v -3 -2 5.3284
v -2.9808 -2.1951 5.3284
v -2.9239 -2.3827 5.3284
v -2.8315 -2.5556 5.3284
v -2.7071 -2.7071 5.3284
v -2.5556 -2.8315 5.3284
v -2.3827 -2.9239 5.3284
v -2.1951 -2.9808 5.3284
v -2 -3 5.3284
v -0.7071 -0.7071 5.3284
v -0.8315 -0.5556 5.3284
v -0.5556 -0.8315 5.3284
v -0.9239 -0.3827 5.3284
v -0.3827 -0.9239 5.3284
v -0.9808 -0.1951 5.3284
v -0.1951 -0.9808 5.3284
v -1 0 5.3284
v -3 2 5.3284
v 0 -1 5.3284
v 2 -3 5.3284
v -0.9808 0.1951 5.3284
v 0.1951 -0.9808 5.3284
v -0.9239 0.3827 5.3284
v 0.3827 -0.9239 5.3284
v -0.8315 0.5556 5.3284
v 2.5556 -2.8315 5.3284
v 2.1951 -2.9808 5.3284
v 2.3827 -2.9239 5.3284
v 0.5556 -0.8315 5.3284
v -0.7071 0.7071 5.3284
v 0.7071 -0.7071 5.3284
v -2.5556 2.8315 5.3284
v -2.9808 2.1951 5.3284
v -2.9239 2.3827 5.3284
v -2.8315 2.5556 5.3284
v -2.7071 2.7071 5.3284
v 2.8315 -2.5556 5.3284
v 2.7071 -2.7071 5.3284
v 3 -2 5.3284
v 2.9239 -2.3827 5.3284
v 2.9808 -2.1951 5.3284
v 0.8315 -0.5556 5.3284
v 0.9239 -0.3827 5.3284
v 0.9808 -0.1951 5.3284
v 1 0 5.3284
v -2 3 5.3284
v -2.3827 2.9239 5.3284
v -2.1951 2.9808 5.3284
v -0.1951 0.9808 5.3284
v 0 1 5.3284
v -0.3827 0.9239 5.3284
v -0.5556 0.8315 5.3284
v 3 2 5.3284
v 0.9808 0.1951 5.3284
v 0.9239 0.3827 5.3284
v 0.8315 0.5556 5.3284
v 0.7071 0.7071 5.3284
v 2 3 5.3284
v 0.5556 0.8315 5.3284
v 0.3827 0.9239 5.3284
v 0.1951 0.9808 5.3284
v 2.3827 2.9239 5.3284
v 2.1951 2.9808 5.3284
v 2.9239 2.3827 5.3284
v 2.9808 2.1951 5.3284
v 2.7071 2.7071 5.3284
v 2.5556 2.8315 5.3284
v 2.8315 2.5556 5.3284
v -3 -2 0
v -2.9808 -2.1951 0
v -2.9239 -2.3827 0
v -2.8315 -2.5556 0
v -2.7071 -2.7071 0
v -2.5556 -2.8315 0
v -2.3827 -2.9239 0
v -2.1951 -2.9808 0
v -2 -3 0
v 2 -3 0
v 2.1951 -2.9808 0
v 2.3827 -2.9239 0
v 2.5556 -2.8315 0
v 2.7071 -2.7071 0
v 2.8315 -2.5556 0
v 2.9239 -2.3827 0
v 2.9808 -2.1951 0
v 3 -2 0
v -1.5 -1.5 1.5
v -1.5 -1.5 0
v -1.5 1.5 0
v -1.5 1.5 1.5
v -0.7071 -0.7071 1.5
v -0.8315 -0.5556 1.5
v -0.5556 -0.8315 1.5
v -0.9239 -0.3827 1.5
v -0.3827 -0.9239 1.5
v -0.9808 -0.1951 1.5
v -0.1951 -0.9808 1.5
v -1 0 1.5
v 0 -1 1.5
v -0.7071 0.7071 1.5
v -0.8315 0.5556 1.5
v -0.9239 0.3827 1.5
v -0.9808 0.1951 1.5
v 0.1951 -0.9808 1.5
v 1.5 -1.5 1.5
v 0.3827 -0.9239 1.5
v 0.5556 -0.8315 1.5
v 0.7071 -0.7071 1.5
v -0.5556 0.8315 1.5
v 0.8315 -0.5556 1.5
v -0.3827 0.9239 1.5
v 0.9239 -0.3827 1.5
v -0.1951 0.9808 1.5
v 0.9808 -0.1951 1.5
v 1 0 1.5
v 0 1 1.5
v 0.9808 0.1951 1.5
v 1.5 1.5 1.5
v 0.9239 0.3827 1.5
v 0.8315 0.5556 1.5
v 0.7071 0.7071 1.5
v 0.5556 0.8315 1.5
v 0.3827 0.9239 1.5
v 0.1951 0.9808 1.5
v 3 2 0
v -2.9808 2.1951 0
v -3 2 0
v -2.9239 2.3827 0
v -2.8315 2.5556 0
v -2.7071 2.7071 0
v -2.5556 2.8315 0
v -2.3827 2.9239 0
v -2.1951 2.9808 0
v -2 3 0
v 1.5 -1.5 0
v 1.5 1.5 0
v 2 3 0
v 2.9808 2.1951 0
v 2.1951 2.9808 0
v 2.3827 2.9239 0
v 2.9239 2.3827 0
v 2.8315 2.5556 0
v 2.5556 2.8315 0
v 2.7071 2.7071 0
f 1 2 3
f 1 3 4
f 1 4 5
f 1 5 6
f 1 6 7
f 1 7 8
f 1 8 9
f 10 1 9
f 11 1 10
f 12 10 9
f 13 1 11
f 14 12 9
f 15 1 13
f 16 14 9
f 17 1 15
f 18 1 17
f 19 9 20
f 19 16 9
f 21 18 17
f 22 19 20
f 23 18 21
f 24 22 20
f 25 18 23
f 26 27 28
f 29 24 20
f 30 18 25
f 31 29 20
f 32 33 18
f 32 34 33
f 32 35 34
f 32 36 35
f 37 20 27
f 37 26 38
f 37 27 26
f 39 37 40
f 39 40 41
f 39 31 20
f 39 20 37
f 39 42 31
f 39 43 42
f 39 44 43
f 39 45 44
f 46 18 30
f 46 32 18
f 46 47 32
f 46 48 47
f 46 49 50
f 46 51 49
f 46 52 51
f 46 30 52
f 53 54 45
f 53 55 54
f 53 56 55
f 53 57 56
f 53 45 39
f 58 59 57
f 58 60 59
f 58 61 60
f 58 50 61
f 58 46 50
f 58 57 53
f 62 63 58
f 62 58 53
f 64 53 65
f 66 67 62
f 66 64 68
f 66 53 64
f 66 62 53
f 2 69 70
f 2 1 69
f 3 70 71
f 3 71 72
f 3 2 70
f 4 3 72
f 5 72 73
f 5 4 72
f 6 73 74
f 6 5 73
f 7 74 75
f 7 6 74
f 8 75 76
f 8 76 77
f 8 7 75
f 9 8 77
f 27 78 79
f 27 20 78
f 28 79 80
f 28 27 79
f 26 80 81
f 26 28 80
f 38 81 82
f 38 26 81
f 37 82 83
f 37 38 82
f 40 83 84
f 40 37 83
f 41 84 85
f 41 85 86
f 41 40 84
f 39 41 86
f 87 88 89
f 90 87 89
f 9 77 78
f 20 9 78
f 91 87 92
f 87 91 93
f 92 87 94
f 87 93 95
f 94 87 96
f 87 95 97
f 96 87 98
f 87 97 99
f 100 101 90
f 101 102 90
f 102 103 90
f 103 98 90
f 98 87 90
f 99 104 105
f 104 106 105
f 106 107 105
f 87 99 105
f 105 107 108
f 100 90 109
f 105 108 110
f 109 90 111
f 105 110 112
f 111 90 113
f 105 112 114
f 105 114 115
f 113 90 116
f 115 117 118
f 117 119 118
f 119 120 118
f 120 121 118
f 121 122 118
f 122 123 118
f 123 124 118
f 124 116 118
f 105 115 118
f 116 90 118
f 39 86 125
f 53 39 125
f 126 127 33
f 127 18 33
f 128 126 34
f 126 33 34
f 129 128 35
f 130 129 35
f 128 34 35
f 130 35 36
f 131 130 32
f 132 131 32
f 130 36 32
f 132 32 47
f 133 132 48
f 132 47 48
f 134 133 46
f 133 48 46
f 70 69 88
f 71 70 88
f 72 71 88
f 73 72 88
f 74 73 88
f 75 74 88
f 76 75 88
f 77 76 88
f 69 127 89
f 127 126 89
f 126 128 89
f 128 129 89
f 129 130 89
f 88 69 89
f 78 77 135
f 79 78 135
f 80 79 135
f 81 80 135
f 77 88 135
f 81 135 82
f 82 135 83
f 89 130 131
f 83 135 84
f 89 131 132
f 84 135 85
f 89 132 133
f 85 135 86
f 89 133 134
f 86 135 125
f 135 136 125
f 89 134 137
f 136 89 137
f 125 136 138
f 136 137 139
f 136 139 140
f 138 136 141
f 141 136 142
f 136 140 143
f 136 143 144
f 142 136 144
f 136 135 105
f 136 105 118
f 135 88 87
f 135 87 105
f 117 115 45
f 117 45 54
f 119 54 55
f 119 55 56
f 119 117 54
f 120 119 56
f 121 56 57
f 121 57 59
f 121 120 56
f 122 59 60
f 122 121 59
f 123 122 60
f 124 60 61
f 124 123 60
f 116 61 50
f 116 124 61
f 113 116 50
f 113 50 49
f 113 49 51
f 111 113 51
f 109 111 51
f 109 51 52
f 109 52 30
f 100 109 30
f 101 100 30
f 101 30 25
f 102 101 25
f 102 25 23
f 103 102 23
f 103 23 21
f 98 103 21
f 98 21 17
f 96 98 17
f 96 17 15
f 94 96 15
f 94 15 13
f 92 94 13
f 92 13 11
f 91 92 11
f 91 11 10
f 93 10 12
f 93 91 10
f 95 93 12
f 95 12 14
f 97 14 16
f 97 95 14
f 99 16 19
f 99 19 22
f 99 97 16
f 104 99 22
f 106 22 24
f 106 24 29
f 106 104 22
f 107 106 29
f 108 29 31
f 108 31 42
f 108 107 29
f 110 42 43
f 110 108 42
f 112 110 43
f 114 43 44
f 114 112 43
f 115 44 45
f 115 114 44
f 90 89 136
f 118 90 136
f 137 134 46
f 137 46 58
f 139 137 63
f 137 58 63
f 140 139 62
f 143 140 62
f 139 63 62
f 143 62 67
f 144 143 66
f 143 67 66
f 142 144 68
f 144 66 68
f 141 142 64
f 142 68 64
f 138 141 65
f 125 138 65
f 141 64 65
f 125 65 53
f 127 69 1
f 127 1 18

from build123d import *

# Parameters (mm, degrees)
F0_W     = 6
F0_H     = 6
F0_W_2   = 3
F0_H_2   = 3
F0_R     = 1
F2_DEPTH = 5.328427
F3_DEPTH = 1.5
F4_R     = 1


with BuildPart() as f2:
    # F0 (on Top) → F2 (new body, through all)
    with BuildSketch(Plane.XY):
        Rectangle(F0_W, F0_H)
        Rectangle(F0_W_2, F0_H_2, mode=Mode.SUBTRACT)
        Rectangle(F0_W_2, F0_H_2)
        Circle(F0_R, mode=Mode.SUBTRACT)
    extrude(amount=F2_DEPTH)

    # F0 (on Top) → F3 (cut)
    with BuildSketch(Plane.XY):
        Rectangle(F0_W_2, F0_H_2)
        Circle(F0_R, mode=Mode.SUBTRACT)
    extrude(amount=F3_DEPTH, mode=Mode.SUBTRACT)

    # F4
    f4_edges = [f2.edges().sort_by_distance(p)[0] for p in [
        (-3, -3, 2.664214),
        (3, -3, 2.664214),
        (3, 3, 2.664214),
        (-3, 3, 2.664214),
    ]]
    fillet(f4_edges, radius=F4_R)


solid = f2.part
